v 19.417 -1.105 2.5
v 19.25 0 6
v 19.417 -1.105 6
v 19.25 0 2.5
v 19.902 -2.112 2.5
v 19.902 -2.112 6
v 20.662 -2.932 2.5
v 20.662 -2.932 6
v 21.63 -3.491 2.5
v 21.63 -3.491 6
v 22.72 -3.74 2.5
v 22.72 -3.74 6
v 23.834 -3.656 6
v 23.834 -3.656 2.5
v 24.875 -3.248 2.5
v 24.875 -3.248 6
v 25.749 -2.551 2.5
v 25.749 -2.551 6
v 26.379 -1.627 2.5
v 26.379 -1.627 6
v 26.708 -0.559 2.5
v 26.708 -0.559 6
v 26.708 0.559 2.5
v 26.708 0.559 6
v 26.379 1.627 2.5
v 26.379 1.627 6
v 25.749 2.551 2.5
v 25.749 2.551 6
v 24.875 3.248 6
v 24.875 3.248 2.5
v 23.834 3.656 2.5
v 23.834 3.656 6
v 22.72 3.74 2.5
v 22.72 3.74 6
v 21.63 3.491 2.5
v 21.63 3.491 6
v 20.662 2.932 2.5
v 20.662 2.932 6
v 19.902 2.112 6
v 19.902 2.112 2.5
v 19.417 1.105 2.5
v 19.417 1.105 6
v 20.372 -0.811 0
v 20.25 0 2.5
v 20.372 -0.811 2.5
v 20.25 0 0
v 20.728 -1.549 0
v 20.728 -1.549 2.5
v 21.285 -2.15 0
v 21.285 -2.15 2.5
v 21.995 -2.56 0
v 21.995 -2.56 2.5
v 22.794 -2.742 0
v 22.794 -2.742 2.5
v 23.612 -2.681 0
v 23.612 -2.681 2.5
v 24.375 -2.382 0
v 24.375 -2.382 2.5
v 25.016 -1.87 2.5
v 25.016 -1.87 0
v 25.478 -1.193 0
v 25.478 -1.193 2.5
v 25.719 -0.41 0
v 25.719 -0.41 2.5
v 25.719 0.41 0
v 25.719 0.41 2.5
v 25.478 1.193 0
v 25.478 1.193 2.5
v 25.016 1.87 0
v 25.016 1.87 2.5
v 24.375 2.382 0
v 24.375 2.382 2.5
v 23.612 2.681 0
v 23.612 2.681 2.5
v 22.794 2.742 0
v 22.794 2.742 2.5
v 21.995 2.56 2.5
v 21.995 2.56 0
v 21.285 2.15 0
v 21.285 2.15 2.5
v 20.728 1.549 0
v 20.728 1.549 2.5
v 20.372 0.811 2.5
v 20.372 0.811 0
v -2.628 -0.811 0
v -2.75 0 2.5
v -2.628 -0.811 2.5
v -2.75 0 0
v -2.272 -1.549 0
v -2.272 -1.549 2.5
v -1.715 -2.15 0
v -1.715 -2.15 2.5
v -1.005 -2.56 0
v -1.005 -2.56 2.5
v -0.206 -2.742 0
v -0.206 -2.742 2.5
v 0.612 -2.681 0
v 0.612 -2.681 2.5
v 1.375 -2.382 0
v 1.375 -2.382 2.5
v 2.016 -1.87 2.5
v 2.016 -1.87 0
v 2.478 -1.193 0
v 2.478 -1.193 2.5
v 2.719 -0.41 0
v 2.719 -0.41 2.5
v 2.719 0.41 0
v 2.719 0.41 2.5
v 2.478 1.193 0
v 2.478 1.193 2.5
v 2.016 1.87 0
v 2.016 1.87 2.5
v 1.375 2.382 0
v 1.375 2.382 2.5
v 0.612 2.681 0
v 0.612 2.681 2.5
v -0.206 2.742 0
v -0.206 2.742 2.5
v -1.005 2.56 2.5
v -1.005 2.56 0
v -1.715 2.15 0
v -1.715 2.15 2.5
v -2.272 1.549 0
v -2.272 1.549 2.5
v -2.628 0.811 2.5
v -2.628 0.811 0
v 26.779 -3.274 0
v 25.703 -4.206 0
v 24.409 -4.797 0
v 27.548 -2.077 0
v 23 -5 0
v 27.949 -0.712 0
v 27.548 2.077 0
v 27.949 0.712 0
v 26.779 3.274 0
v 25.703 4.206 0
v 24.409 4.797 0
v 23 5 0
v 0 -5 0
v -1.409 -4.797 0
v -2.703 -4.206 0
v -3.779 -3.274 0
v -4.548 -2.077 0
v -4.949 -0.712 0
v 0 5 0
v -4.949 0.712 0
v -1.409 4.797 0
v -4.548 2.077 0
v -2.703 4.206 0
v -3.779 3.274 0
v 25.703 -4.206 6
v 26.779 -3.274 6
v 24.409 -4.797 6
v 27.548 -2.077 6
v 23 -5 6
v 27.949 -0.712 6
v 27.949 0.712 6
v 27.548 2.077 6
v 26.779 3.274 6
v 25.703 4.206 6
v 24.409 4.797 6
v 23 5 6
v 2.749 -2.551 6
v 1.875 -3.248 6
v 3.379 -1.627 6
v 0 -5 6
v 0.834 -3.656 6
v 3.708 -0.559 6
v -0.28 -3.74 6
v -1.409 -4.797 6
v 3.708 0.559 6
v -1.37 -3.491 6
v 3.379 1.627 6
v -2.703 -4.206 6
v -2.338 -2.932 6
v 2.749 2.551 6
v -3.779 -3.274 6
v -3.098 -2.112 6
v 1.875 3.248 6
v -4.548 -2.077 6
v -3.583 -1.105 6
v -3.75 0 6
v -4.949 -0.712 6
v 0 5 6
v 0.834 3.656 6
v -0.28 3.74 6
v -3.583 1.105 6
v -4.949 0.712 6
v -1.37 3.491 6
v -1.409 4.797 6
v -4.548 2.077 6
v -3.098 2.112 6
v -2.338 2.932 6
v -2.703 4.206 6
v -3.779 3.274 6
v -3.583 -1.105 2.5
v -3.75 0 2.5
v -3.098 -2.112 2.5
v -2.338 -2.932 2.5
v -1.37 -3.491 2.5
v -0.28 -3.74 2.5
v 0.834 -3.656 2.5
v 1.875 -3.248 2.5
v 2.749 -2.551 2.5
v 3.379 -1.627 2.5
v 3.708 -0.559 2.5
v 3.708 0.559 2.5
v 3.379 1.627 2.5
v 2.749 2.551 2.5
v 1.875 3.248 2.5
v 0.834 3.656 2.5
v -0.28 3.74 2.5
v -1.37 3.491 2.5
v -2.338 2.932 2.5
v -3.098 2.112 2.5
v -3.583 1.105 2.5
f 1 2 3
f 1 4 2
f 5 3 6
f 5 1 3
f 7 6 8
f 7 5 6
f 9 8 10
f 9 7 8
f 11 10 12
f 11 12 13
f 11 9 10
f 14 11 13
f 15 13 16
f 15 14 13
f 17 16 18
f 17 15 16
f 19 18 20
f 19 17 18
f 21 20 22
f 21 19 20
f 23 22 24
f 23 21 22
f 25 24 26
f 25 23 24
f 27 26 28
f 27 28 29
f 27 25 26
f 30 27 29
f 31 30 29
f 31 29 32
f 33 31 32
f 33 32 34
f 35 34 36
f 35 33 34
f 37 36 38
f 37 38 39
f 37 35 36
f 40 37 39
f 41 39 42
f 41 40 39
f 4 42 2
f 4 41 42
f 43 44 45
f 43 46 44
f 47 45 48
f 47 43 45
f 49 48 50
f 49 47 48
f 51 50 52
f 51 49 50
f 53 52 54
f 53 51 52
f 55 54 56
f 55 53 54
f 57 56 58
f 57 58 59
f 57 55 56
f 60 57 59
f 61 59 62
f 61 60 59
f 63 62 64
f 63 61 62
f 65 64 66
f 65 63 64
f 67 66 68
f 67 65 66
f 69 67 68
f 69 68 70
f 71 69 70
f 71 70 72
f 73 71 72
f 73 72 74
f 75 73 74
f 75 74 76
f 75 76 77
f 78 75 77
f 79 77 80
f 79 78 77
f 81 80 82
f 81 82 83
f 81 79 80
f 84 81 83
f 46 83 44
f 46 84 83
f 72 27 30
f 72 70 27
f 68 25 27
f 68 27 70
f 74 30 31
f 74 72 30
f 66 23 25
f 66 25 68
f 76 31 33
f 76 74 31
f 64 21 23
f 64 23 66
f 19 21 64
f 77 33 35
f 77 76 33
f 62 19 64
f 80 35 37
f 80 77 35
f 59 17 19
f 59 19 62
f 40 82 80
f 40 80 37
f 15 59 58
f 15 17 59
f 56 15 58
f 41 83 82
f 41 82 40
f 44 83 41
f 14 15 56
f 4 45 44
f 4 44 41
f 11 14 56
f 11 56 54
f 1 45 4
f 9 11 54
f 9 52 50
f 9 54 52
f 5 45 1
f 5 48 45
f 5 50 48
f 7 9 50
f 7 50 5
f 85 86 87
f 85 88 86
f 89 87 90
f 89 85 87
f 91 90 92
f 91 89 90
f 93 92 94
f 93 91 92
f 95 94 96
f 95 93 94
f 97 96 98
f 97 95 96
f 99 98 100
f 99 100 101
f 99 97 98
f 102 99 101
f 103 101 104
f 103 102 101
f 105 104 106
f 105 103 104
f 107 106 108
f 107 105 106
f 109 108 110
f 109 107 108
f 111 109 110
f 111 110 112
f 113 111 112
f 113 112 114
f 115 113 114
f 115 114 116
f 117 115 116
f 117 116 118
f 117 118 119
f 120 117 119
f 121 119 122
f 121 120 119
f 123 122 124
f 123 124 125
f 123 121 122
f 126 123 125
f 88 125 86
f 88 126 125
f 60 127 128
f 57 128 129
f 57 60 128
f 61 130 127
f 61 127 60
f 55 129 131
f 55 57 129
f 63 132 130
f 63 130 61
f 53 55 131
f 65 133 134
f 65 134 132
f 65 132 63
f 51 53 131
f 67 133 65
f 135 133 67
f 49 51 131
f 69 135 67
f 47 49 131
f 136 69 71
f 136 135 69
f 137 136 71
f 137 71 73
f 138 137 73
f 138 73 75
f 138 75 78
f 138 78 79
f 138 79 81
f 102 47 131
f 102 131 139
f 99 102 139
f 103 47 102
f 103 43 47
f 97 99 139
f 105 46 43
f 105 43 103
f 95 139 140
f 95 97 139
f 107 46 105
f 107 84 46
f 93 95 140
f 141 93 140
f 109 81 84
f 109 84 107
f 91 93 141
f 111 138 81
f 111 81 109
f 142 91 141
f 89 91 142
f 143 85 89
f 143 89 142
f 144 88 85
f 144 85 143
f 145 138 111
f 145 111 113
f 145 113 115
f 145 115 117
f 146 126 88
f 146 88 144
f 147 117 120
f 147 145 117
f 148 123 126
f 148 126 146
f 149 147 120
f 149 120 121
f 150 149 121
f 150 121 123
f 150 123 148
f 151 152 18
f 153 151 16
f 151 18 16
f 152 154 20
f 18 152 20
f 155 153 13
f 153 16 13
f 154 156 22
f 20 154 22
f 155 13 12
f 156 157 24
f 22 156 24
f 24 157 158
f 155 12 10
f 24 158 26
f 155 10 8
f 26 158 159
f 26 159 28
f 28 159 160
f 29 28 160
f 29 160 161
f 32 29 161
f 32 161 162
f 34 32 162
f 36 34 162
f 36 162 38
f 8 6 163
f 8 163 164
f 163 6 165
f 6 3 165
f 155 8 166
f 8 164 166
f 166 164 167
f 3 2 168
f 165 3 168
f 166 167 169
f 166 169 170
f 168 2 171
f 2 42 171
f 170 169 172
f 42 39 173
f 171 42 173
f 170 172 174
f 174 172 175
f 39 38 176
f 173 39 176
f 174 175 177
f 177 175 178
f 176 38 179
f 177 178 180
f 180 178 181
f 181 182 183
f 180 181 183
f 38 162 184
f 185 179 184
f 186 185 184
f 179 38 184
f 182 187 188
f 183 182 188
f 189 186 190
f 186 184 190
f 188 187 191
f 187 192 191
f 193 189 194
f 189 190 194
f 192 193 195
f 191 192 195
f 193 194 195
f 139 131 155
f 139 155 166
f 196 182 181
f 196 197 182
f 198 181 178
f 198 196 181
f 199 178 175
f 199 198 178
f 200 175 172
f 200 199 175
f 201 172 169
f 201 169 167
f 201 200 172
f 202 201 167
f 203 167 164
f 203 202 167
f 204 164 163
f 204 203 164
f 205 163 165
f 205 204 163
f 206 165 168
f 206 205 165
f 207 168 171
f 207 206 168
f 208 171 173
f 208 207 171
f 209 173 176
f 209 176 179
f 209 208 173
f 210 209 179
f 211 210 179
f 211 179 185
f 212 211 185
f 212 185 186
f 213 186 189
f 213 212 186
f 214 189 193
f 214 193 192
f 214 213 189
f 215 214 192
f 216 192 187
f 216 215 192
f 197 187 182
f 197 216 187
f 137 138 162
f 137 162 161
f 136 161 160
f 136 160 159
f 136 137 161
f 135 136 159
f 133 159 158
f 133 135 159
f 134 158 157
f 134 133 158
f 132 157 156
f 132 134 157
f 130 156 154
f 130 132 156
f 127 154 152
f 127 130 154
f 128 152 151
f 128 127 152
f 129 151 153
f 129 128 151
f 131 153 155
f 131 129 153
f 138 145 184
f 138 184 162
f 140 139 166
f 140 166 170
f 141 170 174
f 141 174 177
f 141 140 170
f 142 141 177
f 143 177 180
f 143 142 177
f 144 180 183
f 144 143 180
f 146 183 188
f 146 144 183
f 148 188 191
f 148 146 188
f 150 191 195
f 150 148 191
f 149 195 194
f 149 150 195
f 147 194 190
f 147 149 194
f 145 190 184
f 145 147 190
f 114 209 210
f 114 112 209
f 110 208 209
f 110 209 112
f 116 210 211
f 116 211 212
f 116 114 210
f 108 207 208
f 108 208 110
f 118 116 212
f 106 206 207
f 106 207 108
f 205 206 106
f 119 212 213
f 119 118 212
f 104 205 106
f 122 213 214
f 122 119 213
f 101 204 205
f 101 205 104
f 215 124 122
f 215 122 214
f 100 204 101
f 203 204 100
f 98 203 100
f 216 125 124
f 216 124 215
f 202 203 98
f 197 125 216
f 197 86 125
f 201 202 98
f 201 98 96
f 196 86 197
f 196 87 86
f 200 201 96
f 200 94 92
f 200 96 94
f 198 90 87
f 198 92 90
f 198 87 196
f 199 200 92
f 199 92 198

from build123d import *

# Parameters (mm, degrees)
EXTRUDE_1_DEPTH = 6


with BuildPart() as part:
    # 草图1 → 凸台-拉伸1 (new body)
    with BuildSketch(Plane.XY):
        with BuildLine():
            Line((0, 5), (23, 5))
            ThreePointArc((23, 5), (28, 0), (23, -5))
            Line((23, -5), (0, -5))
            ThreePointArc((0, -5), (-5, 0), (0, 5))
        make_face()
    extrude(amount=EXTRUDE_1_DEPTH)

    # 草图2 → 切除-旋转1 (revolve, cut)
    with BuildSketch(Plane(origin=(0, 0, 0), x_dir=(1, 0, 0), z_dir=(0, 1, 0))):
        Polygon((0, -6), (-3.75, -6), (-3.75, -2.5), (-2.75, -2.5), (-2.75, 0), (0, 0), align=None)
    revolve(axis=Axis((0, 0, 0), (0, 0, 1)), mode=Mode.SUBTRACT)

    # 草图3 → 切除-旋转2 (revolve, cut)
    with BuildSketch(Plane(origin=(0, 0, 0), x_dir=(1, 0, 0), z_dir=(0, 1, 0))):
        Polygon((23, -6), (19.25, -6), (19.25, -2.5), (20.25, -2.5), (20.25, 0), (23, 0), align=None)
    revolve(axis=Axis((23, 0, 0), (0, 0, 1)), mode=Mode.SUBTRACT)


solid = part.part
